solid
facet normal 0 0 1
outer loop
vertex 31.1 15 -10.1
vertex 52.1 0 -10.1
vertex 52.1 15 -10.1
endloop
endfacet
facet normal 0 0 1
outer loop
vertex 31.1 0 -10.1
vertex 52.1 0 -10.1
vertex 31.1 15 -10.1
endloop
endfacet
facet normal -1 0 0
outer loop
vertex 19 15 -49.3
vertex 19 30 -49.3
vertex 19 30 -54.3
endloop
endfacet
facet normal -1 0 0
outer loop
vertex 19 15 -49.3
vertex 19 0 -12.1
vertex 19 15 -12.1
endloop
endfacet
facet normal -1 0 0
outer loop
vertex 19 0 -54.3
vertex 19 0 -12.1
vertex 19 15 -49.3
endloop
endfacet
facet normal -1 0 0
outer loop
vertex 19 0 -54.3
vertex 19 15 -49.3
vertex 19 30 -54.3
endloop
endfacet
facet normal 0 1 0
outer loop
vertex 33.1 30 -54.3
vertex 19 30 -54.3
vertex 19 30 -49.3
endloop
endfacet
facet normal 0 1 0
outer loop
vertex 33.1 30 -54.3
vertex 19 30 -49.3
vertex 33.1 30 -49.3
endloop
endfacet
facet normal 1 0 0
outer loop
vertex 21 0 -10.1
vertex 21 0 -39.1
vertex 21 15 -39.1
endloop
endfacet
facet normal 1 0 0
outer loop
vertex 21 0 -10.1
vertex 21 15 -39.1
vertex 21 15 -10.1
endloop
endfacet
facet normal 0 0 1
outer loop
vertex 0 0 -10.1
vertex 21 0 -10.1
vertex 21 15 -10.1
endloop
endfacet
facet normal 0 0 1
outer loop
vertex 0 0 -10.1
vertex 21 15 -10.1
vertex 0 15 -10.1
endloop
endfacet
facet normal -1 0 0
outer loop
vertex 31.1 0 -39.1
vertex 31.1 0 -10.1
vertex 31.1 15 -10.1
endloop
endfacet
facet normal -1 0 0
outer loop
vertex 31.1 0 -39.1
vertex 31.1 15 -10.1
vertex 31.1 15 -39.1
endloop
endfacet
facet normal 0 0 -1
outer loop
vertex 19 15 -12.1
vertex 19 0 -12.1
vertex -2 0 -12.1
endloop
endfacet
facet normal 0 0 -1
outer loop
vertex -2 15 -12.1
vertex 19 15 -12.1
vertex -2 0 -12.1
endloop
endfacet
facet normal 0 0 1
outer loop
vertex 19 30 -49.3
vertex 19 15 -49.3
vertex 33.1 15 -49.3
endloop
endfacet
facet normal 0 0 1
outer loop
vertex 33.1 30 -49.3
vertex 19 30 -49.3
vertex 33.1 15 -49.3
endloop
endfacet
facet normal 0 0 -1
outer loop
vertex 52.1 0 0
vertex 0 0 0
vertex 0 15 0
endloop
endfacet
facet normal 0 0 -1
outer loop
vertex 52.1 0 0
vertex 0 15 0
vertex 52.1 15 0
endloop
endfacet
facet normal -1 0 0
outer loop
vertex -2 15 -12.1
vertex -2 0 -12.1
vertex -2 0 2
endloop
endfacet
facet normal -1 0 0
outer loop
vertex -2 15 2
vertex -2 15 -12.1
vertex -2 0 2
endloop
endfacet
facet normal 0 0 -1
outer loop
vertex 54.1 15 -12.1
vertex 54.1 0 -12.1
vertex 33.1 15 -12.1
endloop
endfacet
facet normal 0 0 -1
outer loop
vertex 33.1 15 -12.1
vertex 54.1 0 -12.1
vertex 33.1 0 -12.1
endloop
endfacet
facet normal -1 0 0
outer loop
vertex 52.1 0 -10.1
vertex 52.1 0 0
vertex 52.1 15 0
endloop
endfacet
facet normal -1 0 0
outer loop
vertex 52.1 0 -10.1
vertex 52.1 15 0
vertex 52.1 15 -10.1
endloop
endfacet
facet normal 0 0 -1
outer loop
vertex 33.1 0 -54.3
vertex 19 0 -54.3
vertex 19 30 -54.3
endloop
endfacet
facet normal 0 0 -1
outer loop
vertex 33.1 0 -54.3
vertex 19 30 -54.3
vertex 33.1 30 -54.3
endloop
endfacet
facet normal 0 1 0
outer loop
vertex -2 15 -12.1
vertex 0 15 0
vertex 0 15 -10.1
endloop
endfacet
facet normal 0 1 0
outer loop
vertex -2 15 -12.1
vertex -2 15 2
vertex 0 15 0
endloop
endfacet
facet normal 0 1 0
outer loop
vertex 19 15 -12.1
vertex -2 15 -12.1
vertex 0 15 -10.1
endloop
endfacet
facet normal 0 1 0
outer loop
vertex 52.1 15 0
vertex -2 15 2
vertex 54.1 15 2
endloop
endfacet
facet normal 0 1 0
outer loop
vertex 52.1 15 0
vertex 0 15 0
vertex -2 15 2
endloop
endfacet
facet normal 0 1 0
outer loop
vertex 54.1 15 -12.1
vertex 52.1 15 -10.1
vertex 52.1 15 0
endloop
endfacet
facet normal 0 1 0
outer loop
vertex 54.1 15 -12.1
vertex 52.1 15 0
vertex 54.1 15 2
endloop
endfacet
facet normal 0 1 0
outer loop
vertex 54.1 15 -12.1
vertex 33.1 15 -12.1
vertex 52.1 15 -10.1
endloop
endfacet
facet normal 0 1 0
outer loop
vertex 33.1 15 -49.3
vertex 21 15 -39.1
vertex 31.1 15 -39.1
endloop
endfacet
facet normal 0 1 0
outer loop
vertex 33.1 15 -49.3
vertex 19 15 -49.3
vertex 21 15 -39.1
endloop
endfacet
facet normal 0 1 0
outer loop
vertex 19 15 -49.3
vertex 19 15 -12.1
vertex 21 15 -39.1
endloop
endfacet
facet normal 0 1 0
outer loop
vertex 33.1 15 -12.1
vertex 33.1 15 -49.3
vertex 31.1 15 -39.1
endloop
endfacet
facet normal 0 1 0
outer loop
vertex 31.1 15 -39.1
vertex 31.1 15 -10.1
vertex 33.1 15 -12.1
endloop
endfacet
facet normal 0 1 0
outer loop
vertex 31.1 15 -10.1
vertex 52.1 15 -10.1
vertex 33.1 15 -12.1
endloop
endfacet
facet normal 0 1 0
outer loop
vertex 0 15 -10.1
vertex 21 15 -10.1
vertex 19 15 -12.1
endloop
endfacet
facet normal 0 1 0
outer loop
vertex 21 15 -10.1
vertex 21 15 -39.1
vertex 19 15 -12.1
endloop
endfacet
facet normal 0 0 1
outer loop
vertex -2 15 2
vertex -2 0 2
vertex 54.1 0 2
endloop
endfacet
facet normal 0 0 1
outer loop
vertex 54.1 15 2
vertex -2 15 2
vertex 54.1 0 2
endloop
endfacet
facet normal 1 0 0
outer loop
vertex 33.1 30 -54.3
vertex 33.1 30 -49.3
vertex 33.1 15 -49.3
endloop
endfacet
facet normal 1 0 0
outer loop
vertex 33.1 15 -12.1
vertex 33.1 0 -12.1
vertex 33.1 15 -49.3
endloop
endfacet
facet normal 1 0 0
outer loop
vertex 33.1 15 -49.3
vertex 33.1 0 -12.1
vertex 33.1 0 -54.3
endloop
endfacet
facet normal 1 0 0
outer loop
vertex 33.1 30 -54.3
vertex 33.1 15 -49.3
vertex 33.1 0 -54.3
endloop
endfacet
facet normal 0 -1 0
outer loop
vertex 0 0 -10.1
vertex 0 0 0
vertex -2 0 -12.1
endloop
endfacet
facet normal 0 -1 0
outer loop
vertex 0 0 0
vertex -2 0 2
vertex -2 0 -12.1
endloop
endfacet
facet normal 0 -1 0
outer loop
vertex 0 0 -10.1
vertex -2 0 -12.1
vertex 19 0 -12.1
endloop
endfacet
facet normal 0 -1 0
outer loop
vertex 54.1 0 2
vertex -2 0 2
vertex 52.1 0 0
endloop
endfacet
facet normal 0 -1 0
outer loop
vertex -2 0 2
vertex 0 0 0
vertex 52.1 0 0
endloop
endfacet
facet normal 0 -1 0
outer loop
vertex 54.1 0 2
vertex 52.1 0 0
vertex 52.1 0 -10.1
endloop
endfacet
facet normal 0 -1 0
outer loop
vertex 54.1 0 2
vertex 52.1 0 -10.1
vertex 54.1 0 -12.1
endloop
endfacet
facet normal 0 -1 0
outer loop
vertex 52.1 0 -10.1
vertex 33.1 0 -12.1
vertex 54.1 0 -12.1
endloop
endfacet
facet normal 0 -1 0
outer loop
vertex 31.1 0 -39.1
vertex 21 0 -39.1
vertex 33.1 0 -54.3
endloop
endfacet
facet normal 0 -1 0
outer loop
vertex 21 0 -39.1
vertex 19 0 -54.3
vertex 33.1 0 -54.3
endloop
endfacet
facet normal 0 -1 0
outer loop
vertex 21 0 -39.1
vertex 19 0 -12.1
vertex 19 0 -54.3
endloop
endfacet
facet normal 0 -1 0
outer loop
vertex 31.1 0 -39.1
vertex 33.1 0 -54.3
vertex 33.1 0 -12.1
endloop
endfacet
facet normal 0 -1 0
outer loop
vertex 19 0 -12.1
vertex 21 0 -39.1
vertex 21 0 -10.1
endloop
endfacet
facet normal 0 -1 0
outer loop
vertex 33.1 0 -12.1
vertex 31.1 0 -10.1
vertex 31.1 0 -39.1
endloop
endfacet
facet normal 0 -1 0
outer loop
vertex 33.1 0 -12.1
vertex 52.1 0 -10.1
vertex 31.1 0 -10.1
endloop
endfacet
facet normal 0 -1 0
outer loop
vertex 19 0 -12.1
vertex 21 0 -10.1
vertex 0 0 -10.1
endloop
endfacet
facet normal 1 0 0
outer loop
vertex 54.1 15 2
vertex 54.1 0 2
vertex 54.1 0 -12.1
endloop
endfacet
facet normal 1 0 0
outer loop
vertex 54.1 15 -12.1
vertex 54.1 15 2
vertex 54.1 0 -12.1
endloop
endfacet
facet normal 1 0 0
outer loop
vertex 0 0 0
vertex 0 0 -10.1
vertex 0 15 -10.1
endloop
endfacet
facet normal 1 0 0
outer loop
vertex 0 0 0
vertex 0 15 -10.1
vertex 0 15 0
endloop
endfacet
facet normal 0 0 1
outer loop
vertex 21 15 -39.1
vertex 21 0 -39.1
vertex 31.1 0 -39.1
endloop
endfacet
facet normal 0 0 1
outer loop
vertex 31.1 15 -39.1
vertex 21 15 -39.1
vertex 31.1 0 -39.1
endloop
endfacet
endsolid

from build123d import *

# Parameters (mm, degrees)
AUFSATZ_LINEAR_AUSTRAGEN1_DEPTH = 15
SKIZZE2_W                       = 14.1
SKIZZE2_H                       = 5
AUFSATZ_LINEAR_AUSTRAGEN2_DEPTH = 15
SKIZZE3_W                       = 14.1
SKIZZE3_H                       = 15.2
AUFSATZ_LINEAR_AUSTRAGEN3_DEPTH = 15


with BuildPart() as part:
    # Skizze1 → Aufsatz-Linear austragen1 (new body)
    with BuildSketch(Plane(origin=(0, 0, 0), x_dir=(1, 0, 0), z_dir=(0, 1, 0))):
        Polygon((-2, 12.1), (-2, -2), (54.1, -2), (54.1, 12.1), (33.1, 12.1), (33.1, 54.3), (19, 54.3), (19, 12.1), align=None)
        Polygon((0, 0), (52.1, 0), (52.1, 10.1), (31.1, 10.1), (31.1, 52.3), (21, 52.3), (21, 10.1), (0, 10.1), align=None, mode=Mode.SUBTRACT)
    extrude(amount=AUFSATZ_LINEAR_AUSTRAGEN1_DEPTH)

    # Skizze2 → Aufsatz-Linear austragen2 (add)
    with BuildSketch(Plane(origin=(0, 15, 0), x_dir=(1, 0, 0), z_dir=(0, 1, 0))):
        with Locations((26.05, 51.8)):
            Rectangle(SKIZZE2_W, SKIZZE2_H)
    extrude(amount=AUFSATZ_LINEAR_AUSTRAGEN2_DEPTH)

    # Skizze3 → Aufsatz-Linear austragen3 (add)
    with BuildSketch(Plane.XZ):
        with Locations((26.05, -46.7)):
            Rectangle(SKIZZE3_W, SKIZZE3_H)
    extrude(amount=-AUFSATZ_LINEAR_AUSTRAGEN3_DEPTH)


solid = part.part
